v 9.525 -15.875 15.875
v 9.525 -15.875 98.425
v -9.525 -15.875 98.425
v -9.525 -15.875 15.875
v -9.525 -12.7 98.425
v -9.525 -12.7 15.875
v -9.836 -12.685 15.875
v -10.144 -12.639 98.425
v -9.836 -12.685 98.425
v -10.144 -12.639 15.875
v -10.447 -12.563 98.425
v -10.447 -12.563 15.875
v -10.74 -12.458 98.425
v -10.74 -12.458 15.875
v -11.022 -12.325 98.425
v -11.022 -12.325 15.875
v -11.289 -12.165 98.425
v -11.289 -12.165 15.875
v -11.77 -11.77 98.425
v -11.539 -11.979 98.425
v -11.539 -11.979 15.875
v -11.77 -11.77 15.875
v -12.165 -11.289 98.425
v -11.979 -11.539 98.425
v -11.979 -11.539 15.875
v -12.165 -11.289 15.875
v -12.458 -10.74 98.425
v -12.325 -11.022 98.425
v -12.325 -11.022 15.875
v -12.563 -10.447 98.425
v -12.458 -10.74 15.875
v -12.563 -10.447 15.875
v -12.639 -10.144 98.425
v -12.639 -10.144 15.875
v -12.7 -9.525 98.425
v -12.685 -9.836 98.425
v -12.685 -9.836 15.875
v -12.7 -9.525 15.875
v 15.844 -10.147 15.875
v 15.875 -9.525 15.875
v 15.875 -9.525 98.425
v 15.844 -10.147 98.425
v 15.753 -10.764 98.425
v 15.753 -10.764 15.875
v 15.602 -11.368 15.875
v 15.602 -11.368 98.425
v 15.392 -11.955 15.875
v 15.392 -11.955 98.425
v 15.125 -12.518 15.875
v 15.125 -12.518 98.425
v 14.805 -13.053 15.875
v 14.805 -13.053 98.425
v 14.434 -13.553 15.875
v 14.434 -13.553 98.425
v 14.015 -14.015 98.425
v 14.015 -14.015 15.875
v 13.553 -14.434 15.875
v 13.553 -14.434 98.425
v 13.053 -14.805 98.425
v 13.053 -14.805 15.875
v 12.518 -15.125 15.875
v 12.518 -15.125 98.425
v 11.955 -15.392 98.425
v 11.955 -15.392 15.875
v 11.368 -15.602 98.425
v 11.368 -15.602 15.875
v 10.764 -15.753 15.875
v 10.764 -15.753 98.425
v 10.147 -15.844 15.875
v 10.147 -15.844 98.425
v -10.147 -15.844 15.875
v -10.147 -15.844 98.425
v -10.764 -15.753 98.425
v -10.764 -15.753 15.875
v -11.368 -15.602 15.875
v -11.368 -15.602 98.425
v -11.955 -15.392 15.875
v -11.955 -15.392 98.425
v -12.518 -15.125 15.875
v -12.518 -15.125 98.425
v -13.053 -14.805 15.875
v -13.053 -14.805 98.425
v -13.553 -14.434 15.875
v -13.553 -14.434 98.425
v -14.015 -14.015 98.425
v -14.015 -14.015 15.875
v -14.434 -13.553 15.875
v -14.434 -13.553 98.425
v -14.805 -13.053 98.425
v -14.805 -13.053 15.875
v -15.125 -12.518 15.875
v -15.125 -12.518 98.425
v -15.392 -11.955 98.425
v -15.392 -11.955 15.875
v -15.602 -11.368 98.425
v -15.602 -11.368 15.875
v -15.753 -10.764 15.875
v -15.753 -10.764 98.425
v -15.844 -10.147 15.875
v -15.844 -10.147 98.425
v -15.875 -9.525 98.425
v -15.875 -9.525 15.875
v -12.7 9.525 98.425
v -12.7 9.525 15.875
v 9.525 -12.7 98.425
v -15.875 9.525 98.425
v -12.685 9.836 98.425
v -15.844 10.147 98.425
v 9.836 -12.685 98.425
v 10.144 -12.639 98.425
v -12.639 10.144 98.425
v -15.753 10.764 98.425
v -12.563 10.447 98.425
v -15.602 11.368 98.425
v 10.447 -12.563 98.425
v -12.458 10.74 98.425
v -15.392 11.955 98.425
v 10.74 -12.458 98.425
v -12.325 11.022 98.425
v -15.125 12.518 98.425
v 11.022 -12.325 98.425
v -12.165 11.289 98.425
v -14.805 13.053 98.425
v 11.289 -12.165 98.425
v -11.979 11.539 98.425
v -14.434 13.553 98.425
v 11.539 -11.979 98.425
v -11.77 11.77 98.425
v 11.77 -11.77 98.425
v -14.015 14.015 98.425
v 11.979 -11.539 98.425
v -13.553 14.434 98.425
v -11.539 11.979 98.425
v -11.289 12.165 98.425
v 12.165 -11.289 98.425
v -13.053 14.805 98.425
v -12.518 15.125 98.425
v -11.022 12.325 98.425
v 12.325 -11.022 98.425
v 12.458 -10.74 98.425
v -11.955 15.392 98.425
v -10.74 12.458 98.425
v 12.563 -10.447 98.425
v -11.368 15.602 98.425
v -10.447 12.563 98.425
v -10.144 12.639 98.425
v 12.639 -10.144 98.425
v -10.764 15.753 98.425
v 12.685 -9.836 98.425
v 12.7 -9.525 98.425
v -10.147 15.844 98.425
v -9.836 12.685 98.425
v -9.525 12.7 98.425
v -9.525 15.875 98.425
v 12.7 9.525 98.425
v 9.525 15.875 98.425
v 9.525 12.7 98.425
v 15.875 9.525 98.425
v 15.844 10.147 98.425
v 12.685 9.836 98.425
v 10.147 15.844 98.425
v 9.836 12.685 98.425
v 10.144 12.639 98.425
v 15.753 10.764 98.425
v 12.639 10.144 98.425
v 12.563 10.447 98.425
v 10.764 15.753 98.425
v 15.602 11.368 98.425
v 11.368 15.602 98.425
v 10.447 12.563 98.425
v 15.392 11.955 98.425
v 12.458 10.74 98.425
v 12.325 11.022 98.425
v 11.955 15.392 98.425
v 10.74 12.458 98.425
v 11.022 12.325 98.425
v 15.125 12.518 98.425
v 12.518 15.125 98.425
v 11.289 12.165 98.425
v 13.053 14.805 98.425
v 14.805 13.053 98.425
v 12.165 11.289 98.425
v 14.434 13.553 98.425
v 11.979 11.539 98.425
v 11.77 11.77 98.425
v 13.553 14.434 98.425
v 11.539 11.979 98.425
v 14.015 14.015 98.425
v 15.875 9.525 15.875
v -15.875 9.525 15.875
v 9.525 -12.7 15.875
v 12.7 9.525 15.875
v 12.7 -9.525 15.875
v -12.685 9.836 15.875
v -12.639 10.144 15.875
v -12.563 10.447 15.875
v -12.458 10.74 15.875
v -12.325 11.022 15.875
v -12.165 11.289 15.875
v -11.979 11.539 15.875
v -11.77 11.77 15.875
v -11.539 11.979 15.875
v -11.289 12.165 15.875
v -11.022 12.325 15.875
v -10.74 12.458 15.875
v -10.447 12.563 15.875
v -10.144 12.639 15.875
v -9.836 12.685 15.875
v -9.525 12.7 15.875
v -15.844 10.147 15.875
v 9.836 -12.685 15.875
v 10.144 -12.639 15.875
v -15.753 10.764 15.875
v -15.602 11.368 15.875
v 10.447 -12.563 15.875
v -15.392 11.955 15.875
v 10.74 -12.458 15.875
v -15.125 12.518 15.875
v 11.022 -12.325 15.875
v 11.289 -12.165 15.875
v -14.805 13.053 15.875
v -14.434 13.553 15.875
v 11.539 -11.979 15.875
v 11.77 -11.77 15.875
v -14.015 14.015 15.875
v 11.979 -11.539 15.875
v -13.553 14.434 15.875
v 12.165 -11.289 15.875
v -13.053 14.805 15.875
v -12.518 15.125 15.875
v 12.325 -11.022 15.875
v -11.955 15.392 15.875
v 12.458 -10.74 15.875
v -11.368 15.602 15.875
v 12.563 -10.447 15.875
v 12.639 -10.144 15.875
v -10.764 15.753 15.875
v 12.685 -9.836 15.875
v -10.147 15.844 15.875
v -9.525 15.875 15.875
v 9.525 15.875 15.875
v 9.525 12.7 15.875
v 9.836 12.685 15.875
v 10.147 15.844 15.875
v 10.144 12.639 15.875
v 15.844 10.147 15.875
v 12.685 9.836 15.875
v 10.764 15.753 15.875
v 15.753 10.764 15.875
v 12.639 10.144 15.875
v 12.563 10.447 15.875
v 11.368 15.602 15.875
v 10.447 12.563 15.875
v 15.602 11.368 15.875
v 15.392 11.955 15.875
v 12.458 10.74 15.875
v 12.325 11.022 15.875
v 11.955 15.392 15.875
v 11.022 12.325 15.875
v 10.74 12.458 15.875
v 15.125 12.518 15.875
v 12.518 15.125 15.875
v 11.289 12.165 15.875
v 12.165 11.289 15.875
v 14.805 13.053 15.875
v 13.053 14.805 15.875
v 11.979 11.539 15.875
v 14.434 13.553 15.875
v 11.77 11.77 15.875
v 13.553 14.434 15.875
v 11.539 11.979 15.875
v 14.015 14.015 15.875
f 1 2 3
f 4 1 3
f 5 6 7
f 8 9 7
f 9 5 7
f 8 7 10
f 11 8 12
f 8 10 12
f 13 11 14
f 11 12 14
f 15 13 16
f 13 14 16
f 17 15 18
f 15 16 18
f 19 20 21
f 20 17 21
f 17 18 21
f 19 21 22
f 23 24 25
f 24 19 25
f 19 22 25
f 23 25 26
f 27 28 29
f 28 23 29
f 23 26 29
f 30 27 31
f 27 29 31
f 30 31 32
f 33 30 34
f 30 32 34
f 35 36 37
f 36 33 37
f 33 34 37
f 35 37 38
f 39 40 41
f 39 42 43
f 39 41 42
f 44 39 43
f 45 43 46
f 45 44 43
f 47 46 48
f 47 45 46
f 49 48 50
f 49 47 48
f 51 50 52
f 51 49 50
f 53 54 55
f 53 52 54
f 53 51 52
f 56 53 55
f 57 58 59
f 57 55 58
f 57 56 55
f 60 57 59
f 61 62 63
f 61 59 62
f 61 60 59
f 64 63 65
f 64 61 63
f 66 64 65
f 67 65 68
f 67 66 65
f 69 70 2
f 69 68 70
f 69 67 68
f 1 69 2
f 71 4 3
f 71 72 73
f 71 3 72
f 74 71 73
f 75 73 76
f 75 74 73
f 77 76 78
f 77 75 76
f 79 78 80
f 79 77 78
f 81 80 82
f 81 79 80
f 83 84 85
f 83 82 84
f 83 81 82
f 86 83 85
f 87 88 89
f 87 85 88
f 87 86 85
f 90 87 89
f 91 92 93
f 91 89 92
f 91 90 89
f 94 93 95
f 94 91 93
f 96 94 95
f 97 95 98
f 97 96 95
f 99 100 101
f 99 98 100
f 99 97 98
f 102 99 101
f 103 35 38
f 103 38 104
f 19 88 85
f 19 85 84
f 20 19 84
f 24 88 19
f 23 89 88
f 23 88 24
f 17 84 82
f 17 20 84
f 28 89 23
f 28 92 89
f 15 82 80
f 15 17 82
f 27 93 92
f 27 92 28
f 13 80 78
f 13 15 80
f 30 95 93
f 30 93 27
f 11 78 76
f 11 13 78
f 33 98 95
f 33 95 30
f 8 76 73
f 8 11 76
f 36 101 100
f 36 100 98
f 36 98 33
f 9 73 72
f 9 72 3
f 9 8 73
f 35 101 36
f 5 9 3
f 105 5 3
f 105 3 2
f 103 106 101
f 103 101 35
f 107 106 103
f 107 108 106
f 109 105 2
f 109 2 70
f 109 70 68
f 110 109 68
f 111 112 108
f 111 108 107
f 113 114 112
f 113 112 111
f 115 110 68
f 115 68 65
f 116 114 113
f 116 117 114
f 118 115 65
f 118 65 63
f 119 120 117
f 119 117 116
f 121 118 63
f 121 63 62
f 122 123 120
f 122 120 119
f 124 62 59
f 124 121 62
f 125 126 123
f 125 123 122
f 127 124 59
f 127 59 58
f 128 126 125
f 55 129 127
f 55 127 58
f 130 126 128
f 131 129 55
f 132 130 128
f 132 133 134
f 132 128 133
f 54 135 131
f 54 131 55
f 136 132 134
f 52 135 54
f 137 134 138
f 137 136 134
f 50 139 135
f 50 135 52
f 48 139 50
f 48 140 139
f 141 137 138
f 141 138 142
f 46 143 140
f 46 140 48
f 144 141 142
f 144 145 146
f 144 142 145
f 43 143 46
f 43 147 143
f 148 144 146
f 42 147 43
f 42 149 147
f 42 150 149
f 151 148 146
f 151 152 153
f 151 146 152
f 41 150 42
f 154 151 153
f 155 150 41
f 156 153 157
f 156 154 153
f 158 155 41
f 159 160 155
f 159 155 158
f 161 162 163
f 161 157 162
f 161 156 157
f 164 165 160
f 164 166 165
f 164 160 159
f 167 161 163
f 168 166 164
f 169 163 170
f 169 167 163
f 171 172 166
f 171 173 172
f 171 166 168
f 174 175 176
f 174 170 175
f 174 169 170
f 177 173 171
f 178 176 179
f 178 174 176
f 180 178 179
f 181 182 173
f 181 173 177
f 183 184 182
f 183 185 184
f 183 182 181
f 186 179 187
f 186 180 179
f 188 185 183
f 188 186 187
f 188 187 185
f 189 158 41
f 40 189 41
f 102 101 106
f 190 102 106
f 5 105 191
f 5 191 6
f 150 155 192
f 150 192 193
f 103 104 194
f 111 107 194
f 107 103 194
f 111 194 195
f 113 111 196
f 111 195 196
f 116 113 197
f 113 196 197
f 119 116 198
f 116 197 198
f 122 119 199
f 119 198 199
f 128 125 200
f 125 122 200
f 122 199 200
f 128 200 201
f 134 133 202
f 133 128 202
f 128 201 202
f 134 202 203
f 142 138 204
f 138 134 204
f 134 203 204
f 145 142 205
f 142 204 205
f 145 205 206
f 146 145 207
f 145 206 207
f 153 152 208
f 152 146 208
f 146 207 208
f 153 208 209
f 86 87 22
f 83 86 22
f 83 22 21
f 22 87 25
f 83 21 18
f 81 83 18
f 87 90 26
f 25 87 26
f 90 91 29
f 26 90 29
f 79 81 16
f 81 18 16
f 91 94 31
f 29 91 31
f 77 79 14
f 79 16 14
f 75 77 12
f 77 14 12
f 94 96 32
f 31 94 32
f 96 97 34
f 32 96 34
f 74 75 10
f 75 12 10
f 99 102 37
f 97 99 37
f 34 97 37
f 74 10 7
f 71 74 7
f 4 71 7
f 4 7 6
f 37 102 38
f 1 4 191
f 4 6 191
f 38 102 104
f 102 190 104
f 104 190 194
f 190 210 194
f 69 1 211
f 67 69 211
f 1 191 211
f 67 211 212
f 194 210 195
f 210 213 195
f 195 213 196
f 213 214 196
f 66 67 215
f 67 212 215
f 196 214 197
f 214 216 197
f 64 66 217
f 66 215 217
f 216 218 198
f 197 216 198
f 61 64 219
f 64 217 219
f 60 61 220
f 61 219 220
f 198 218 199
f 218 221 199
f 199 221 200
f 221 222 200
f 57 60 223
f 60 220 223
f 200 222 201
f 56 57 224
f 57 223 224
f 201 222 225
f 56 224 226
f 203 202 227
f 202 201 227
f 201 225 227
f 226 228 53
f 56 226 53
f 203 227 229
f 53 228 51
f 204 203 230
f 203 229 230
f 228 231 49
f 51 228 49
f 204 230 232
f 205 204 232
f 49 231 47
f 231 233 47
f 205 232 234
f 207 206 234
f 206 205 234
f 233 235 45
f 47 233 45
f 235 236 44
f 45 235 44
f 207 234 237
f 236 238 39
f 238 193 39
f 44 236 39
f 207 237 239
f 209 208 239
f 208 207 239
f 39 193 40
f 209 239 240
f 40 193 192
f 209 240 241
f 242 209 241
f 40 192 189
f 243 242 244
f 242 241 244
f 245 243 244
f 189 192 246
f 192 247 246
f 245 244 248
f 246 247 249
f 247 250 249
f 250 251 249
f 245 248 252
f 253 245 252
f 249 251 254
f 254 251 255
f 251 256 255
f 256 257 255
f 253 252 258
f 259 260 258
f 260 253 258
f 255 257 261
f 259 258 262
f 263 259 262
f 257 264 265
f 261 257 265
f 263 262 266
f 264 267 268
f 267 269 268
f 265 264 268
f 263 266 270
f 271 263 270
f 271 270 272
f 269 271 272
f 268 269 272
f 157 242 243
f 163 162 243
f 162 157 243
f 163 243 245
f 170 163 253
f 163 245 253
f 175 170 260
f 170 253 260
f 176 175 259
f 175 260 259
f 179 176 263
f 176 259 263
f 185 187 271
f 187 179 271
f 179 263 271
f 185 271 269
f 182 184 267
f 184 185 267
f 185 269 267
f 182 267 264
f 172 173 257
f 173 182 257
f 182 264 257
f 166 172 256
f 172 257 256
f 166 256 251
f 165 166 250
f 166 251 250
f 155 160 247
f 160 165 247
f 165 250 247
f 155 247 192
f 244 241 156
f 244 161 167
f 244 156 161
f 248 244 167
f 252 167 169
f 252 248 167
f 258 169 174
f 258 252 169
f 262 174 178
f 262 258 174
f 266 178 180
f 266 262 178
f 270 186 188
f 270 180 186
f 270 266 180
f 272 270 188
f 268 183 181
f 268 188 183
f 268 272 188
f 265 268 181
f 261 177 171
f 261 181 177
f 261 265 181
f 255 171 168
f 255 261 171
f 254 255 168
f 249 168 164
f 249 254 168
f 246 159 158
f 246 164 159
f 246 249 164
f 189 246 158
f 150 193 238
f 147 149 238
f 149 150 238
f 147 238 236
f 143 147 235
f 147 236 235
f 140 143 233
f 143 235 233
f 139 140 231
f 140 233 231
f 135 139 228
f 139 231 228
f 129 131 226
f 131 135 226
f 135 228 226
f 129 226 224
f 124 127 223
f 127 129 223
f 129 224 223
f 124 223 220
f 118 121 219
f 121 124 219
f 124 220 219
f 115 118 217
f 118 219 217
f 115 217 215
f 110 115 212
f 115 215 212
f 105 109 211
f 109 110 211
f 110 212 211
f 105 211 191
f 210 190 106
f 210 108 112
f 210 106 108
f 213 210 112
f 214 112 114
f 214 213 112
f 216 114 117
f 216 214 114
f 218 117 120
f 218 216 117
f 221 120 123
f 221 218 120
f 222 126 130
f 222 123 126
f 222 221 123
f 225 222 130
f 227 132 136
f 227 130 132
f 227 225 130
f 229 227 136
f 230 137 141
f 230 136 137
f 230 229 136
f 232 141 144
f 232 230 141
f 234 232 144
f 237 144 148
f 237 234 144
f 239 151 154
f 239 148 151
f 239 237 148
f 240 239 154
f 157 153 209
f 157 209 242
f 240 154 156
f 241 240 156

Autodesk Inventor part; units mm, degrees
ref_plane "Start plane" through (0, 0, 15.875) normal (0, 0, 1) x (1, 0, 0)
ref_plane "End plane" through (0, 0, 98.425) normal (0, 0, 1) x (1, 0, 0)
sketch "Sketch" plane through (0, 0, 0) normal (0, 0, 1) x (1, 0, 0)
  line L0 (-15.875, -9.525) -> (-15.875, 9.525)
  line L1 (-9.525, 15.875) -> (9.525, 15.875)
  line L2 (15.875, 9.525) -> (15.875, -9.525)
  line L3 (9.525, -15.875) -> (-9.525, -15.875)
  arc A0 (-15.875, -9.525) -> (-9.525, -15.875) centre (-9.525, -9.525) ccw
  arc A1 (-9.525, 15.875) -> (-15.875, 9.525) centre (-9.525, 9.525) ccw
  arc A2 (15.875, 9.525) -> (9.525, 15.875) centre (9.525, 9.525) ccw
  arc A3 (9.525, -15.875) -> (15.875, -9.525) centre (9.525, -9.525) ccw
  arc A4 (-9.525, 12.7) -> (-12.7, 9.525) centre (-9.525, 9.525) ccw
  line L4 (-9.525, 12.7) -> (9.525, 12.7)
  arc A5 (12.7, 9.525) -> (9.525, 12.7) centre (9.525, 9.525) ccw
  line L5 (12.7, 9.525) -> (12.7, -9.525)
  arc A6 (9.525, -12.7) -> (12.7, -9.525) centre (9.525, -9.525) ccw
  line L6 (9.525, -12.7) -> (-9.525, -12.7)
  arc A7 (-12.7, -9.525) -> (-9.525, -12.7) centre (-9.525, -9.525) ccw
  line L7 (-12.7, -9.525) -> (-12.7, 9.525)
  line L8 (0, 24.0662) -> (0, -24.0662) construction
  line L9 (-24.0662, 0) -> (24.0662, 0) construction
  dimension "d10" = 31.75
  dimension "d11" = 31.75
  dimension "d12" = 3.175
  dimension "d15" = 15.875
  dimension "d16" = 15.875
  dimension "d17" = 6.35
extrude "Body" add sketch "Sketch" along normal up to surface (82.55 mm away) from surface at 15.875
sketch "Sketch3" plane through (0, 0, 0) normal (0, 0, 1) x (1, 0, 0)
  line L0 (0, 0) -> (10, 0)
ref_plane "Work Plane3" through (0, 0, 0) normal (0, -1, 0) x (1, 0, 0)
sketch "Sketch4" plane through (0, 0, 0) normal (0, -1, 0) x (1, 0, 0)
  line L0 (-2, 15.875) -> (12, 15.875)
  line L1 (-2, 98.425) -> (12, 98.425)
  dimension "d19" = 82.55
ref_plane "Work Plane4" through (-9.525, 101.6003, 15.875) normal (0, 0, -1) x (-1, 0, 0)
split "Split1" plane through (-9.525, 101.6003, 15.875) removes the side toward (0, 0, -1)
ref_plane "Work Plane5" through (9.525, 101.6003, 98.425) normal (0, 0, 1) x (1, 0, 0)
split "Split2" plane through (9.525, 101.6003, 98.425) removes the side toward (0, 0, 1)
equation "\"d10\" = G_H"
equation "\"d11\" = G_W"
equation "\"d12\" = G_T"
equation "\"d15\" = 0.5 * d10"
equation "\"d16\" = 0.5 * d11"
equation "\"d17\" = G_IR"
equation "\"d3\" = G_L"
equation "\"G_W\" = 31.75"
equation "\"G_H\" = 31.75"
equation "\"G_T\" = 3.175"
equation "\"G_IR\" = 6.35"
equation "\"G_L\" = d19"
equation "\"G_OFFSET_START\" = -15.875"
equation "\"G_OFFSET_END\" = -15.875"
equation "\"d13\" = -G_OFFSET_START"
equation "\"d14\" = G_OFFSET_END + B_L"
equation "\"B_L\" = 114.3"
properties part number "AISC HSS - 1-1/4x1-1/4x1/8 - 3.25" material "Steel, Mild"
